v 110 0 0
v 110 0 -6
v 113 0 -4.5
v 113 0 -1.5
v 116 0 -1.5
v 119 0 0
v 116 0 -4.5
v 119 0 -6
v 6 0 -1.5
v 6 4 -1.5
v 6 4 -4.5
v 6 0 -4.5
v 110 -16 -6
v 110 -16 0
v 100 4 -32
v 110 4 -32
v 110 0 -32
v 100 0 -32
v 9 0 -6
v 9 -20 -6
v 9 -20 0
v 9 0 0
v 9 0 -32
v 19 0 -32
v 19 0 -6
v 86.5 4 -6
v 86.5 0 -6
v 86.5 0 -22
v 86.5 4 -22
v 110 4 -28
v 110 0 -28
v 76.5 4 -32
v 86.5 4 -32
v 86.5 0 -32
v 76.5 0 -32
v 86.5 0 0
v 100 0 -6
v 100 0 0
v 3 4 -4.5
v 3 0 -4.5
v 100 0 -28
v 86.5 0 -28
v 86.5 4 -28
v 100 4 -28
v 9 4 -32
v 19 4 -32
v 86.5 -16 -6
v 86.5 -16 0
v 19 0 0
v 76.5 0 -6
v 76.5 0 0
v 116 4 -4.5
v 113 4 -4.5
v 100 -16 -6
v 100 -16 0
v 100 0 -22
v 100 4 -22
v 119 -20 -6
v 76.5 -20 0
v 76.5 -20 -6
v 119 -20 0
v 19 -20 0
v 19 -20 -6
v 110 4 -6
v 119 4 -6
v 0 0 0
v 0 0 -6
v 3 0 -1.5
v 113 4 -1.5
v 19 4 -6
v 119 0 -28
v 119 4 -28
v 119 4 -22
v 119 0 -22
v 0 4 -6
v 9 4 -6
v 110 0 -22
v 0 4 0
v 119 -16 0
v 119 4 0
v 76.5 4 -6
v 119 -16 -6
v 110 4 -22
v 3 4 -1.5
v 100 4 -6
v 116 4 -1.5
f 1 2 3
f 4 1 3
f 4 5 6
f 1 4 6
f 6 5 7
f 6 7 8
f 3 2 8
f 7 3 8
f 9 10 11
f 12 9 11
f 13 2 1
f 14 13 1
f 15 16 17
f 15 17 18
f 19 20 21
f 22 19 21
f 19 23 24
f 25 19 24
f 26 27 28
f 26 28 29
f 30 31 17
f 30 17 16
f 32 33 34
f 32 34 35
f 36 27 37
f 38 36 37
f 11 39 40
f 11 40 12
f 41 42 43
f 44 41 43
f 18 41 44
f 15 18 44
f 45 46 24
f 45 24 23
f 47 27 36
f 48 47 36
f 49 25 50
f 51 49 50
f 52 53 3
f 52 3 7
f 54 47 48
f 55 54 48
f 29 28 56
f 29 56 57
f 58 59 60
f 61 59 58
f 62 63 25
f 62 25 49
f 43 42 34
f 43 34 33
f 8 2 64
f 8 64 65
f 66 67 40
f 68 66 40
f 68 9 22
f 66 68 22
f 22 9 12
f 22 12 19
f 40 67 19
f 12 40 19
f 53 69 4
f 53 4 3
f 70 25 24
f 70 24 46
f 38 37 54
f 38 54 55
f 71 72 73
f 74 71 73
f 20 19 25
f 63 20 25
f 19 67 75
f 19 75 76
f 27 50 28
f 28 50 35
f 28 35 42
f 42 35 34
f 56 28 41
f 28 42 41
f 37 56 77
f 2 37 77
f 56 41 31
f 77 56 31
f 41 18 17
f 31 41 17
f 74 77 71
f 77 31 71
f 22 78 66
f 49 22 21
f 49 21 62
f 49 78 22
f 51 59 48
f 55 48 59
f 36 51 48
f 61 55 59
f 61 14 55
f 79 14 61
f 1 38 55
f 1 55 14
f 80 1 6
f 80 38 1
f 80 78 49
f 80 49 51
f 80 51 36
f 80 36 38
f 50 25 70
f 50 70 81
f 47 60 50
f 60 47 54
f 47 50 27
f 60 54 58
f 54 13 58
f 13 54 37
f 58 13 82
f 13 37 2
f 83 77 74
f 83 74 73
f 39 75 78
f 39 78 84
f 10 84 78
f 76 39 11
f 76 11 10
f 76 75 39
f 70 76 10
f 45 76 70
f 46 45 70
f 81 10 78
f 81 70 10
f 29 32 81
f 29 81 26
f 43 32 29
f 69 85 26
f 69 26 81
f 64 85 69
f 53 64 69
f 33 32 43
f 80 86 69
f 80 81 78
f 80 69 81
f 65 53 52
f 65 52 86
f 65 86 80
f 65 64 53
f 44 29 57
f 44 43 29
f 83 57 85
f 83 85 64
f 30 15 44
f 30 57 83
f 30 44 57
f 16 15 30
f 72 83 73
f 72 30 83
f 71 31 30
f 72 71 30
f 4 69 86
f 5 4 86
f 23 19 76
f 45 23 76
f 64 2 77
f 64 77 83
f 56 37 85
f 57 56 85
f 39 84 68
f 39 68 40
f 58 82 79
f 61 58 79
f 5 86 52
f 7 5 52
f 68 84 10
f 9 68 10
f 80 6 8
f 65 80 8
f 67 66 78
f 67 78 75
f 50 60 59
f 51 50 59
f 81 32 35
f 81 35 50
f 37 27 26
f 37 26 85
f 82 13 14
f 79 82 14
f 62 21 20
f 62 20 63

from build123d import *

# Parameters (mm, degrees)
SKETCH1_W           = 119
SKETCH1_H           = 6
BOSS_EXTRUDE1_DEPTH = 4
CUT_EXTRUDE1_REACH  = 6
SKETCH2_W           = 3
SKETCH2_H           = 3
SKETCH3_W           = 10
SKETCH3_H           = 4
BOSS_EXTRUDE2_DEPTH = 26
SKETCH4_W           = 10
SKETCH4_H           = 6
BOSS_EXTRUDE3_DEPTH = 20
SKETCH5_W           = 6
SKETCH5_H           = 4
BOSS_EXTRUDE4_DEPTH = 42.5


with BuildPart() as part:
    # Sketch1 → Boss-Extrude1 (new body)
    with BuildSketch(Plane(origin=(0, 0, 0), x_dir=(1, 0, 0), z_dir=(0, 1, 0))):
        with Locations((59.5, 3)):
            Rectangle(SKETCH1_W, SKETCH1_H)
    extrude(amount=BOSS_EXTRUDE1_DEPTH)

    # Sketch2 → Cut-Extrude1 (cut, up to next)
    with BuildSketch(Plane(origin=(0, 4, 0), x_dir=(1, 0, 0), z_dir=(0, 1, 0)), mode=Mode.PRIVATE) as cut_extrude1_sk1:
        with Locations((114.5, 3)):
            Rectangle(SKETCH2_W, SKETCH2_H)
    cut_extrude1_tool1 = extrude(cut_extrude1_sk1.sketch, amount=-CUT_EXTRUDE1_REACH, mode=Mode.PRIVATE) & part.part
    add(cut_extrude1_tool1.solids().sort_by_distance((114.5, 4, -3))[0], mode=Mode.SUBTRACT)
    # Sketch2 → Cut-Extrude1 (cut, up to next)
    with BuildSketch(Plane(origin=(0, 4, 0), x_dir=(1, 0, 0), z_dir=(0, 1, 0)), mode=Mode.PRIVATE) as cut_extrude1_sk2:
        with Locations((4.5, 3)):
            Rectangle(SKETCH2_W, SKETCH2_H)
    cut_extrude1_tool2 = extrude(cut_extrude1_sk2.sketch, amount=-CUT_EXTRUDE1_REACH, mode=Mode.PRIVATE) & part.part
    add(cut_extrude1_tool2.solids().sort_by_distance((4.5, 4, -3))[0], mode=Mode.SUBTRACT)

    # Sketch3 → Boss-Extrude2 (add)
    with BuildSketch(Plane(origin=(0, 0, -6), x_dir=(-1, 0, 0), z_dir=(0, 0, -1))):
        with Locations((-105, 2)):
            Rectangle(SKETCH3_W, SKETCH3_H)
        with Locations((-81.5, 2)):
            Rectangle(SKETCH3_W, SKETCH3_H)
        with Locations((-14, 2)):
            Rectangle(SKETCH3_W, SKETCH3_H)
    extrude(amount=BOSS_EXTRUDE2_DEPTH)

    # Sketch4 → Boss-Extrude3 (add)
    with BuildSketch(Plane.XZ):
        with Locations((105, -3)):
            Rectangle(SKETCH4_W, SKETCH4_H)
        with Locations((81.5, -3)):
            Rectangle(SKETCH4_W, SKETCH4_H)
        with Locations((14, -3)):
            Rectangle(SKETCH4_W, SKETCH4_H)
    extrude(amount=BOSS_EXTRUDE3_DEPTH)

    # Sketch5 → Boss-Extrude4 (add)
    with BuildSketch(Plane.ZY.offset(-76.5)):
        with Locations((-25, 2)):
            Rectangle(SKETCH5_W, SKETCH5_H)
        with Locations((-3, -18)):
            Rectangle(SKETCH5_W, SKETCH5_H)
    extrude(amount=-BOSS_EXTRUDE4_DEPTH)


solid = part.part
